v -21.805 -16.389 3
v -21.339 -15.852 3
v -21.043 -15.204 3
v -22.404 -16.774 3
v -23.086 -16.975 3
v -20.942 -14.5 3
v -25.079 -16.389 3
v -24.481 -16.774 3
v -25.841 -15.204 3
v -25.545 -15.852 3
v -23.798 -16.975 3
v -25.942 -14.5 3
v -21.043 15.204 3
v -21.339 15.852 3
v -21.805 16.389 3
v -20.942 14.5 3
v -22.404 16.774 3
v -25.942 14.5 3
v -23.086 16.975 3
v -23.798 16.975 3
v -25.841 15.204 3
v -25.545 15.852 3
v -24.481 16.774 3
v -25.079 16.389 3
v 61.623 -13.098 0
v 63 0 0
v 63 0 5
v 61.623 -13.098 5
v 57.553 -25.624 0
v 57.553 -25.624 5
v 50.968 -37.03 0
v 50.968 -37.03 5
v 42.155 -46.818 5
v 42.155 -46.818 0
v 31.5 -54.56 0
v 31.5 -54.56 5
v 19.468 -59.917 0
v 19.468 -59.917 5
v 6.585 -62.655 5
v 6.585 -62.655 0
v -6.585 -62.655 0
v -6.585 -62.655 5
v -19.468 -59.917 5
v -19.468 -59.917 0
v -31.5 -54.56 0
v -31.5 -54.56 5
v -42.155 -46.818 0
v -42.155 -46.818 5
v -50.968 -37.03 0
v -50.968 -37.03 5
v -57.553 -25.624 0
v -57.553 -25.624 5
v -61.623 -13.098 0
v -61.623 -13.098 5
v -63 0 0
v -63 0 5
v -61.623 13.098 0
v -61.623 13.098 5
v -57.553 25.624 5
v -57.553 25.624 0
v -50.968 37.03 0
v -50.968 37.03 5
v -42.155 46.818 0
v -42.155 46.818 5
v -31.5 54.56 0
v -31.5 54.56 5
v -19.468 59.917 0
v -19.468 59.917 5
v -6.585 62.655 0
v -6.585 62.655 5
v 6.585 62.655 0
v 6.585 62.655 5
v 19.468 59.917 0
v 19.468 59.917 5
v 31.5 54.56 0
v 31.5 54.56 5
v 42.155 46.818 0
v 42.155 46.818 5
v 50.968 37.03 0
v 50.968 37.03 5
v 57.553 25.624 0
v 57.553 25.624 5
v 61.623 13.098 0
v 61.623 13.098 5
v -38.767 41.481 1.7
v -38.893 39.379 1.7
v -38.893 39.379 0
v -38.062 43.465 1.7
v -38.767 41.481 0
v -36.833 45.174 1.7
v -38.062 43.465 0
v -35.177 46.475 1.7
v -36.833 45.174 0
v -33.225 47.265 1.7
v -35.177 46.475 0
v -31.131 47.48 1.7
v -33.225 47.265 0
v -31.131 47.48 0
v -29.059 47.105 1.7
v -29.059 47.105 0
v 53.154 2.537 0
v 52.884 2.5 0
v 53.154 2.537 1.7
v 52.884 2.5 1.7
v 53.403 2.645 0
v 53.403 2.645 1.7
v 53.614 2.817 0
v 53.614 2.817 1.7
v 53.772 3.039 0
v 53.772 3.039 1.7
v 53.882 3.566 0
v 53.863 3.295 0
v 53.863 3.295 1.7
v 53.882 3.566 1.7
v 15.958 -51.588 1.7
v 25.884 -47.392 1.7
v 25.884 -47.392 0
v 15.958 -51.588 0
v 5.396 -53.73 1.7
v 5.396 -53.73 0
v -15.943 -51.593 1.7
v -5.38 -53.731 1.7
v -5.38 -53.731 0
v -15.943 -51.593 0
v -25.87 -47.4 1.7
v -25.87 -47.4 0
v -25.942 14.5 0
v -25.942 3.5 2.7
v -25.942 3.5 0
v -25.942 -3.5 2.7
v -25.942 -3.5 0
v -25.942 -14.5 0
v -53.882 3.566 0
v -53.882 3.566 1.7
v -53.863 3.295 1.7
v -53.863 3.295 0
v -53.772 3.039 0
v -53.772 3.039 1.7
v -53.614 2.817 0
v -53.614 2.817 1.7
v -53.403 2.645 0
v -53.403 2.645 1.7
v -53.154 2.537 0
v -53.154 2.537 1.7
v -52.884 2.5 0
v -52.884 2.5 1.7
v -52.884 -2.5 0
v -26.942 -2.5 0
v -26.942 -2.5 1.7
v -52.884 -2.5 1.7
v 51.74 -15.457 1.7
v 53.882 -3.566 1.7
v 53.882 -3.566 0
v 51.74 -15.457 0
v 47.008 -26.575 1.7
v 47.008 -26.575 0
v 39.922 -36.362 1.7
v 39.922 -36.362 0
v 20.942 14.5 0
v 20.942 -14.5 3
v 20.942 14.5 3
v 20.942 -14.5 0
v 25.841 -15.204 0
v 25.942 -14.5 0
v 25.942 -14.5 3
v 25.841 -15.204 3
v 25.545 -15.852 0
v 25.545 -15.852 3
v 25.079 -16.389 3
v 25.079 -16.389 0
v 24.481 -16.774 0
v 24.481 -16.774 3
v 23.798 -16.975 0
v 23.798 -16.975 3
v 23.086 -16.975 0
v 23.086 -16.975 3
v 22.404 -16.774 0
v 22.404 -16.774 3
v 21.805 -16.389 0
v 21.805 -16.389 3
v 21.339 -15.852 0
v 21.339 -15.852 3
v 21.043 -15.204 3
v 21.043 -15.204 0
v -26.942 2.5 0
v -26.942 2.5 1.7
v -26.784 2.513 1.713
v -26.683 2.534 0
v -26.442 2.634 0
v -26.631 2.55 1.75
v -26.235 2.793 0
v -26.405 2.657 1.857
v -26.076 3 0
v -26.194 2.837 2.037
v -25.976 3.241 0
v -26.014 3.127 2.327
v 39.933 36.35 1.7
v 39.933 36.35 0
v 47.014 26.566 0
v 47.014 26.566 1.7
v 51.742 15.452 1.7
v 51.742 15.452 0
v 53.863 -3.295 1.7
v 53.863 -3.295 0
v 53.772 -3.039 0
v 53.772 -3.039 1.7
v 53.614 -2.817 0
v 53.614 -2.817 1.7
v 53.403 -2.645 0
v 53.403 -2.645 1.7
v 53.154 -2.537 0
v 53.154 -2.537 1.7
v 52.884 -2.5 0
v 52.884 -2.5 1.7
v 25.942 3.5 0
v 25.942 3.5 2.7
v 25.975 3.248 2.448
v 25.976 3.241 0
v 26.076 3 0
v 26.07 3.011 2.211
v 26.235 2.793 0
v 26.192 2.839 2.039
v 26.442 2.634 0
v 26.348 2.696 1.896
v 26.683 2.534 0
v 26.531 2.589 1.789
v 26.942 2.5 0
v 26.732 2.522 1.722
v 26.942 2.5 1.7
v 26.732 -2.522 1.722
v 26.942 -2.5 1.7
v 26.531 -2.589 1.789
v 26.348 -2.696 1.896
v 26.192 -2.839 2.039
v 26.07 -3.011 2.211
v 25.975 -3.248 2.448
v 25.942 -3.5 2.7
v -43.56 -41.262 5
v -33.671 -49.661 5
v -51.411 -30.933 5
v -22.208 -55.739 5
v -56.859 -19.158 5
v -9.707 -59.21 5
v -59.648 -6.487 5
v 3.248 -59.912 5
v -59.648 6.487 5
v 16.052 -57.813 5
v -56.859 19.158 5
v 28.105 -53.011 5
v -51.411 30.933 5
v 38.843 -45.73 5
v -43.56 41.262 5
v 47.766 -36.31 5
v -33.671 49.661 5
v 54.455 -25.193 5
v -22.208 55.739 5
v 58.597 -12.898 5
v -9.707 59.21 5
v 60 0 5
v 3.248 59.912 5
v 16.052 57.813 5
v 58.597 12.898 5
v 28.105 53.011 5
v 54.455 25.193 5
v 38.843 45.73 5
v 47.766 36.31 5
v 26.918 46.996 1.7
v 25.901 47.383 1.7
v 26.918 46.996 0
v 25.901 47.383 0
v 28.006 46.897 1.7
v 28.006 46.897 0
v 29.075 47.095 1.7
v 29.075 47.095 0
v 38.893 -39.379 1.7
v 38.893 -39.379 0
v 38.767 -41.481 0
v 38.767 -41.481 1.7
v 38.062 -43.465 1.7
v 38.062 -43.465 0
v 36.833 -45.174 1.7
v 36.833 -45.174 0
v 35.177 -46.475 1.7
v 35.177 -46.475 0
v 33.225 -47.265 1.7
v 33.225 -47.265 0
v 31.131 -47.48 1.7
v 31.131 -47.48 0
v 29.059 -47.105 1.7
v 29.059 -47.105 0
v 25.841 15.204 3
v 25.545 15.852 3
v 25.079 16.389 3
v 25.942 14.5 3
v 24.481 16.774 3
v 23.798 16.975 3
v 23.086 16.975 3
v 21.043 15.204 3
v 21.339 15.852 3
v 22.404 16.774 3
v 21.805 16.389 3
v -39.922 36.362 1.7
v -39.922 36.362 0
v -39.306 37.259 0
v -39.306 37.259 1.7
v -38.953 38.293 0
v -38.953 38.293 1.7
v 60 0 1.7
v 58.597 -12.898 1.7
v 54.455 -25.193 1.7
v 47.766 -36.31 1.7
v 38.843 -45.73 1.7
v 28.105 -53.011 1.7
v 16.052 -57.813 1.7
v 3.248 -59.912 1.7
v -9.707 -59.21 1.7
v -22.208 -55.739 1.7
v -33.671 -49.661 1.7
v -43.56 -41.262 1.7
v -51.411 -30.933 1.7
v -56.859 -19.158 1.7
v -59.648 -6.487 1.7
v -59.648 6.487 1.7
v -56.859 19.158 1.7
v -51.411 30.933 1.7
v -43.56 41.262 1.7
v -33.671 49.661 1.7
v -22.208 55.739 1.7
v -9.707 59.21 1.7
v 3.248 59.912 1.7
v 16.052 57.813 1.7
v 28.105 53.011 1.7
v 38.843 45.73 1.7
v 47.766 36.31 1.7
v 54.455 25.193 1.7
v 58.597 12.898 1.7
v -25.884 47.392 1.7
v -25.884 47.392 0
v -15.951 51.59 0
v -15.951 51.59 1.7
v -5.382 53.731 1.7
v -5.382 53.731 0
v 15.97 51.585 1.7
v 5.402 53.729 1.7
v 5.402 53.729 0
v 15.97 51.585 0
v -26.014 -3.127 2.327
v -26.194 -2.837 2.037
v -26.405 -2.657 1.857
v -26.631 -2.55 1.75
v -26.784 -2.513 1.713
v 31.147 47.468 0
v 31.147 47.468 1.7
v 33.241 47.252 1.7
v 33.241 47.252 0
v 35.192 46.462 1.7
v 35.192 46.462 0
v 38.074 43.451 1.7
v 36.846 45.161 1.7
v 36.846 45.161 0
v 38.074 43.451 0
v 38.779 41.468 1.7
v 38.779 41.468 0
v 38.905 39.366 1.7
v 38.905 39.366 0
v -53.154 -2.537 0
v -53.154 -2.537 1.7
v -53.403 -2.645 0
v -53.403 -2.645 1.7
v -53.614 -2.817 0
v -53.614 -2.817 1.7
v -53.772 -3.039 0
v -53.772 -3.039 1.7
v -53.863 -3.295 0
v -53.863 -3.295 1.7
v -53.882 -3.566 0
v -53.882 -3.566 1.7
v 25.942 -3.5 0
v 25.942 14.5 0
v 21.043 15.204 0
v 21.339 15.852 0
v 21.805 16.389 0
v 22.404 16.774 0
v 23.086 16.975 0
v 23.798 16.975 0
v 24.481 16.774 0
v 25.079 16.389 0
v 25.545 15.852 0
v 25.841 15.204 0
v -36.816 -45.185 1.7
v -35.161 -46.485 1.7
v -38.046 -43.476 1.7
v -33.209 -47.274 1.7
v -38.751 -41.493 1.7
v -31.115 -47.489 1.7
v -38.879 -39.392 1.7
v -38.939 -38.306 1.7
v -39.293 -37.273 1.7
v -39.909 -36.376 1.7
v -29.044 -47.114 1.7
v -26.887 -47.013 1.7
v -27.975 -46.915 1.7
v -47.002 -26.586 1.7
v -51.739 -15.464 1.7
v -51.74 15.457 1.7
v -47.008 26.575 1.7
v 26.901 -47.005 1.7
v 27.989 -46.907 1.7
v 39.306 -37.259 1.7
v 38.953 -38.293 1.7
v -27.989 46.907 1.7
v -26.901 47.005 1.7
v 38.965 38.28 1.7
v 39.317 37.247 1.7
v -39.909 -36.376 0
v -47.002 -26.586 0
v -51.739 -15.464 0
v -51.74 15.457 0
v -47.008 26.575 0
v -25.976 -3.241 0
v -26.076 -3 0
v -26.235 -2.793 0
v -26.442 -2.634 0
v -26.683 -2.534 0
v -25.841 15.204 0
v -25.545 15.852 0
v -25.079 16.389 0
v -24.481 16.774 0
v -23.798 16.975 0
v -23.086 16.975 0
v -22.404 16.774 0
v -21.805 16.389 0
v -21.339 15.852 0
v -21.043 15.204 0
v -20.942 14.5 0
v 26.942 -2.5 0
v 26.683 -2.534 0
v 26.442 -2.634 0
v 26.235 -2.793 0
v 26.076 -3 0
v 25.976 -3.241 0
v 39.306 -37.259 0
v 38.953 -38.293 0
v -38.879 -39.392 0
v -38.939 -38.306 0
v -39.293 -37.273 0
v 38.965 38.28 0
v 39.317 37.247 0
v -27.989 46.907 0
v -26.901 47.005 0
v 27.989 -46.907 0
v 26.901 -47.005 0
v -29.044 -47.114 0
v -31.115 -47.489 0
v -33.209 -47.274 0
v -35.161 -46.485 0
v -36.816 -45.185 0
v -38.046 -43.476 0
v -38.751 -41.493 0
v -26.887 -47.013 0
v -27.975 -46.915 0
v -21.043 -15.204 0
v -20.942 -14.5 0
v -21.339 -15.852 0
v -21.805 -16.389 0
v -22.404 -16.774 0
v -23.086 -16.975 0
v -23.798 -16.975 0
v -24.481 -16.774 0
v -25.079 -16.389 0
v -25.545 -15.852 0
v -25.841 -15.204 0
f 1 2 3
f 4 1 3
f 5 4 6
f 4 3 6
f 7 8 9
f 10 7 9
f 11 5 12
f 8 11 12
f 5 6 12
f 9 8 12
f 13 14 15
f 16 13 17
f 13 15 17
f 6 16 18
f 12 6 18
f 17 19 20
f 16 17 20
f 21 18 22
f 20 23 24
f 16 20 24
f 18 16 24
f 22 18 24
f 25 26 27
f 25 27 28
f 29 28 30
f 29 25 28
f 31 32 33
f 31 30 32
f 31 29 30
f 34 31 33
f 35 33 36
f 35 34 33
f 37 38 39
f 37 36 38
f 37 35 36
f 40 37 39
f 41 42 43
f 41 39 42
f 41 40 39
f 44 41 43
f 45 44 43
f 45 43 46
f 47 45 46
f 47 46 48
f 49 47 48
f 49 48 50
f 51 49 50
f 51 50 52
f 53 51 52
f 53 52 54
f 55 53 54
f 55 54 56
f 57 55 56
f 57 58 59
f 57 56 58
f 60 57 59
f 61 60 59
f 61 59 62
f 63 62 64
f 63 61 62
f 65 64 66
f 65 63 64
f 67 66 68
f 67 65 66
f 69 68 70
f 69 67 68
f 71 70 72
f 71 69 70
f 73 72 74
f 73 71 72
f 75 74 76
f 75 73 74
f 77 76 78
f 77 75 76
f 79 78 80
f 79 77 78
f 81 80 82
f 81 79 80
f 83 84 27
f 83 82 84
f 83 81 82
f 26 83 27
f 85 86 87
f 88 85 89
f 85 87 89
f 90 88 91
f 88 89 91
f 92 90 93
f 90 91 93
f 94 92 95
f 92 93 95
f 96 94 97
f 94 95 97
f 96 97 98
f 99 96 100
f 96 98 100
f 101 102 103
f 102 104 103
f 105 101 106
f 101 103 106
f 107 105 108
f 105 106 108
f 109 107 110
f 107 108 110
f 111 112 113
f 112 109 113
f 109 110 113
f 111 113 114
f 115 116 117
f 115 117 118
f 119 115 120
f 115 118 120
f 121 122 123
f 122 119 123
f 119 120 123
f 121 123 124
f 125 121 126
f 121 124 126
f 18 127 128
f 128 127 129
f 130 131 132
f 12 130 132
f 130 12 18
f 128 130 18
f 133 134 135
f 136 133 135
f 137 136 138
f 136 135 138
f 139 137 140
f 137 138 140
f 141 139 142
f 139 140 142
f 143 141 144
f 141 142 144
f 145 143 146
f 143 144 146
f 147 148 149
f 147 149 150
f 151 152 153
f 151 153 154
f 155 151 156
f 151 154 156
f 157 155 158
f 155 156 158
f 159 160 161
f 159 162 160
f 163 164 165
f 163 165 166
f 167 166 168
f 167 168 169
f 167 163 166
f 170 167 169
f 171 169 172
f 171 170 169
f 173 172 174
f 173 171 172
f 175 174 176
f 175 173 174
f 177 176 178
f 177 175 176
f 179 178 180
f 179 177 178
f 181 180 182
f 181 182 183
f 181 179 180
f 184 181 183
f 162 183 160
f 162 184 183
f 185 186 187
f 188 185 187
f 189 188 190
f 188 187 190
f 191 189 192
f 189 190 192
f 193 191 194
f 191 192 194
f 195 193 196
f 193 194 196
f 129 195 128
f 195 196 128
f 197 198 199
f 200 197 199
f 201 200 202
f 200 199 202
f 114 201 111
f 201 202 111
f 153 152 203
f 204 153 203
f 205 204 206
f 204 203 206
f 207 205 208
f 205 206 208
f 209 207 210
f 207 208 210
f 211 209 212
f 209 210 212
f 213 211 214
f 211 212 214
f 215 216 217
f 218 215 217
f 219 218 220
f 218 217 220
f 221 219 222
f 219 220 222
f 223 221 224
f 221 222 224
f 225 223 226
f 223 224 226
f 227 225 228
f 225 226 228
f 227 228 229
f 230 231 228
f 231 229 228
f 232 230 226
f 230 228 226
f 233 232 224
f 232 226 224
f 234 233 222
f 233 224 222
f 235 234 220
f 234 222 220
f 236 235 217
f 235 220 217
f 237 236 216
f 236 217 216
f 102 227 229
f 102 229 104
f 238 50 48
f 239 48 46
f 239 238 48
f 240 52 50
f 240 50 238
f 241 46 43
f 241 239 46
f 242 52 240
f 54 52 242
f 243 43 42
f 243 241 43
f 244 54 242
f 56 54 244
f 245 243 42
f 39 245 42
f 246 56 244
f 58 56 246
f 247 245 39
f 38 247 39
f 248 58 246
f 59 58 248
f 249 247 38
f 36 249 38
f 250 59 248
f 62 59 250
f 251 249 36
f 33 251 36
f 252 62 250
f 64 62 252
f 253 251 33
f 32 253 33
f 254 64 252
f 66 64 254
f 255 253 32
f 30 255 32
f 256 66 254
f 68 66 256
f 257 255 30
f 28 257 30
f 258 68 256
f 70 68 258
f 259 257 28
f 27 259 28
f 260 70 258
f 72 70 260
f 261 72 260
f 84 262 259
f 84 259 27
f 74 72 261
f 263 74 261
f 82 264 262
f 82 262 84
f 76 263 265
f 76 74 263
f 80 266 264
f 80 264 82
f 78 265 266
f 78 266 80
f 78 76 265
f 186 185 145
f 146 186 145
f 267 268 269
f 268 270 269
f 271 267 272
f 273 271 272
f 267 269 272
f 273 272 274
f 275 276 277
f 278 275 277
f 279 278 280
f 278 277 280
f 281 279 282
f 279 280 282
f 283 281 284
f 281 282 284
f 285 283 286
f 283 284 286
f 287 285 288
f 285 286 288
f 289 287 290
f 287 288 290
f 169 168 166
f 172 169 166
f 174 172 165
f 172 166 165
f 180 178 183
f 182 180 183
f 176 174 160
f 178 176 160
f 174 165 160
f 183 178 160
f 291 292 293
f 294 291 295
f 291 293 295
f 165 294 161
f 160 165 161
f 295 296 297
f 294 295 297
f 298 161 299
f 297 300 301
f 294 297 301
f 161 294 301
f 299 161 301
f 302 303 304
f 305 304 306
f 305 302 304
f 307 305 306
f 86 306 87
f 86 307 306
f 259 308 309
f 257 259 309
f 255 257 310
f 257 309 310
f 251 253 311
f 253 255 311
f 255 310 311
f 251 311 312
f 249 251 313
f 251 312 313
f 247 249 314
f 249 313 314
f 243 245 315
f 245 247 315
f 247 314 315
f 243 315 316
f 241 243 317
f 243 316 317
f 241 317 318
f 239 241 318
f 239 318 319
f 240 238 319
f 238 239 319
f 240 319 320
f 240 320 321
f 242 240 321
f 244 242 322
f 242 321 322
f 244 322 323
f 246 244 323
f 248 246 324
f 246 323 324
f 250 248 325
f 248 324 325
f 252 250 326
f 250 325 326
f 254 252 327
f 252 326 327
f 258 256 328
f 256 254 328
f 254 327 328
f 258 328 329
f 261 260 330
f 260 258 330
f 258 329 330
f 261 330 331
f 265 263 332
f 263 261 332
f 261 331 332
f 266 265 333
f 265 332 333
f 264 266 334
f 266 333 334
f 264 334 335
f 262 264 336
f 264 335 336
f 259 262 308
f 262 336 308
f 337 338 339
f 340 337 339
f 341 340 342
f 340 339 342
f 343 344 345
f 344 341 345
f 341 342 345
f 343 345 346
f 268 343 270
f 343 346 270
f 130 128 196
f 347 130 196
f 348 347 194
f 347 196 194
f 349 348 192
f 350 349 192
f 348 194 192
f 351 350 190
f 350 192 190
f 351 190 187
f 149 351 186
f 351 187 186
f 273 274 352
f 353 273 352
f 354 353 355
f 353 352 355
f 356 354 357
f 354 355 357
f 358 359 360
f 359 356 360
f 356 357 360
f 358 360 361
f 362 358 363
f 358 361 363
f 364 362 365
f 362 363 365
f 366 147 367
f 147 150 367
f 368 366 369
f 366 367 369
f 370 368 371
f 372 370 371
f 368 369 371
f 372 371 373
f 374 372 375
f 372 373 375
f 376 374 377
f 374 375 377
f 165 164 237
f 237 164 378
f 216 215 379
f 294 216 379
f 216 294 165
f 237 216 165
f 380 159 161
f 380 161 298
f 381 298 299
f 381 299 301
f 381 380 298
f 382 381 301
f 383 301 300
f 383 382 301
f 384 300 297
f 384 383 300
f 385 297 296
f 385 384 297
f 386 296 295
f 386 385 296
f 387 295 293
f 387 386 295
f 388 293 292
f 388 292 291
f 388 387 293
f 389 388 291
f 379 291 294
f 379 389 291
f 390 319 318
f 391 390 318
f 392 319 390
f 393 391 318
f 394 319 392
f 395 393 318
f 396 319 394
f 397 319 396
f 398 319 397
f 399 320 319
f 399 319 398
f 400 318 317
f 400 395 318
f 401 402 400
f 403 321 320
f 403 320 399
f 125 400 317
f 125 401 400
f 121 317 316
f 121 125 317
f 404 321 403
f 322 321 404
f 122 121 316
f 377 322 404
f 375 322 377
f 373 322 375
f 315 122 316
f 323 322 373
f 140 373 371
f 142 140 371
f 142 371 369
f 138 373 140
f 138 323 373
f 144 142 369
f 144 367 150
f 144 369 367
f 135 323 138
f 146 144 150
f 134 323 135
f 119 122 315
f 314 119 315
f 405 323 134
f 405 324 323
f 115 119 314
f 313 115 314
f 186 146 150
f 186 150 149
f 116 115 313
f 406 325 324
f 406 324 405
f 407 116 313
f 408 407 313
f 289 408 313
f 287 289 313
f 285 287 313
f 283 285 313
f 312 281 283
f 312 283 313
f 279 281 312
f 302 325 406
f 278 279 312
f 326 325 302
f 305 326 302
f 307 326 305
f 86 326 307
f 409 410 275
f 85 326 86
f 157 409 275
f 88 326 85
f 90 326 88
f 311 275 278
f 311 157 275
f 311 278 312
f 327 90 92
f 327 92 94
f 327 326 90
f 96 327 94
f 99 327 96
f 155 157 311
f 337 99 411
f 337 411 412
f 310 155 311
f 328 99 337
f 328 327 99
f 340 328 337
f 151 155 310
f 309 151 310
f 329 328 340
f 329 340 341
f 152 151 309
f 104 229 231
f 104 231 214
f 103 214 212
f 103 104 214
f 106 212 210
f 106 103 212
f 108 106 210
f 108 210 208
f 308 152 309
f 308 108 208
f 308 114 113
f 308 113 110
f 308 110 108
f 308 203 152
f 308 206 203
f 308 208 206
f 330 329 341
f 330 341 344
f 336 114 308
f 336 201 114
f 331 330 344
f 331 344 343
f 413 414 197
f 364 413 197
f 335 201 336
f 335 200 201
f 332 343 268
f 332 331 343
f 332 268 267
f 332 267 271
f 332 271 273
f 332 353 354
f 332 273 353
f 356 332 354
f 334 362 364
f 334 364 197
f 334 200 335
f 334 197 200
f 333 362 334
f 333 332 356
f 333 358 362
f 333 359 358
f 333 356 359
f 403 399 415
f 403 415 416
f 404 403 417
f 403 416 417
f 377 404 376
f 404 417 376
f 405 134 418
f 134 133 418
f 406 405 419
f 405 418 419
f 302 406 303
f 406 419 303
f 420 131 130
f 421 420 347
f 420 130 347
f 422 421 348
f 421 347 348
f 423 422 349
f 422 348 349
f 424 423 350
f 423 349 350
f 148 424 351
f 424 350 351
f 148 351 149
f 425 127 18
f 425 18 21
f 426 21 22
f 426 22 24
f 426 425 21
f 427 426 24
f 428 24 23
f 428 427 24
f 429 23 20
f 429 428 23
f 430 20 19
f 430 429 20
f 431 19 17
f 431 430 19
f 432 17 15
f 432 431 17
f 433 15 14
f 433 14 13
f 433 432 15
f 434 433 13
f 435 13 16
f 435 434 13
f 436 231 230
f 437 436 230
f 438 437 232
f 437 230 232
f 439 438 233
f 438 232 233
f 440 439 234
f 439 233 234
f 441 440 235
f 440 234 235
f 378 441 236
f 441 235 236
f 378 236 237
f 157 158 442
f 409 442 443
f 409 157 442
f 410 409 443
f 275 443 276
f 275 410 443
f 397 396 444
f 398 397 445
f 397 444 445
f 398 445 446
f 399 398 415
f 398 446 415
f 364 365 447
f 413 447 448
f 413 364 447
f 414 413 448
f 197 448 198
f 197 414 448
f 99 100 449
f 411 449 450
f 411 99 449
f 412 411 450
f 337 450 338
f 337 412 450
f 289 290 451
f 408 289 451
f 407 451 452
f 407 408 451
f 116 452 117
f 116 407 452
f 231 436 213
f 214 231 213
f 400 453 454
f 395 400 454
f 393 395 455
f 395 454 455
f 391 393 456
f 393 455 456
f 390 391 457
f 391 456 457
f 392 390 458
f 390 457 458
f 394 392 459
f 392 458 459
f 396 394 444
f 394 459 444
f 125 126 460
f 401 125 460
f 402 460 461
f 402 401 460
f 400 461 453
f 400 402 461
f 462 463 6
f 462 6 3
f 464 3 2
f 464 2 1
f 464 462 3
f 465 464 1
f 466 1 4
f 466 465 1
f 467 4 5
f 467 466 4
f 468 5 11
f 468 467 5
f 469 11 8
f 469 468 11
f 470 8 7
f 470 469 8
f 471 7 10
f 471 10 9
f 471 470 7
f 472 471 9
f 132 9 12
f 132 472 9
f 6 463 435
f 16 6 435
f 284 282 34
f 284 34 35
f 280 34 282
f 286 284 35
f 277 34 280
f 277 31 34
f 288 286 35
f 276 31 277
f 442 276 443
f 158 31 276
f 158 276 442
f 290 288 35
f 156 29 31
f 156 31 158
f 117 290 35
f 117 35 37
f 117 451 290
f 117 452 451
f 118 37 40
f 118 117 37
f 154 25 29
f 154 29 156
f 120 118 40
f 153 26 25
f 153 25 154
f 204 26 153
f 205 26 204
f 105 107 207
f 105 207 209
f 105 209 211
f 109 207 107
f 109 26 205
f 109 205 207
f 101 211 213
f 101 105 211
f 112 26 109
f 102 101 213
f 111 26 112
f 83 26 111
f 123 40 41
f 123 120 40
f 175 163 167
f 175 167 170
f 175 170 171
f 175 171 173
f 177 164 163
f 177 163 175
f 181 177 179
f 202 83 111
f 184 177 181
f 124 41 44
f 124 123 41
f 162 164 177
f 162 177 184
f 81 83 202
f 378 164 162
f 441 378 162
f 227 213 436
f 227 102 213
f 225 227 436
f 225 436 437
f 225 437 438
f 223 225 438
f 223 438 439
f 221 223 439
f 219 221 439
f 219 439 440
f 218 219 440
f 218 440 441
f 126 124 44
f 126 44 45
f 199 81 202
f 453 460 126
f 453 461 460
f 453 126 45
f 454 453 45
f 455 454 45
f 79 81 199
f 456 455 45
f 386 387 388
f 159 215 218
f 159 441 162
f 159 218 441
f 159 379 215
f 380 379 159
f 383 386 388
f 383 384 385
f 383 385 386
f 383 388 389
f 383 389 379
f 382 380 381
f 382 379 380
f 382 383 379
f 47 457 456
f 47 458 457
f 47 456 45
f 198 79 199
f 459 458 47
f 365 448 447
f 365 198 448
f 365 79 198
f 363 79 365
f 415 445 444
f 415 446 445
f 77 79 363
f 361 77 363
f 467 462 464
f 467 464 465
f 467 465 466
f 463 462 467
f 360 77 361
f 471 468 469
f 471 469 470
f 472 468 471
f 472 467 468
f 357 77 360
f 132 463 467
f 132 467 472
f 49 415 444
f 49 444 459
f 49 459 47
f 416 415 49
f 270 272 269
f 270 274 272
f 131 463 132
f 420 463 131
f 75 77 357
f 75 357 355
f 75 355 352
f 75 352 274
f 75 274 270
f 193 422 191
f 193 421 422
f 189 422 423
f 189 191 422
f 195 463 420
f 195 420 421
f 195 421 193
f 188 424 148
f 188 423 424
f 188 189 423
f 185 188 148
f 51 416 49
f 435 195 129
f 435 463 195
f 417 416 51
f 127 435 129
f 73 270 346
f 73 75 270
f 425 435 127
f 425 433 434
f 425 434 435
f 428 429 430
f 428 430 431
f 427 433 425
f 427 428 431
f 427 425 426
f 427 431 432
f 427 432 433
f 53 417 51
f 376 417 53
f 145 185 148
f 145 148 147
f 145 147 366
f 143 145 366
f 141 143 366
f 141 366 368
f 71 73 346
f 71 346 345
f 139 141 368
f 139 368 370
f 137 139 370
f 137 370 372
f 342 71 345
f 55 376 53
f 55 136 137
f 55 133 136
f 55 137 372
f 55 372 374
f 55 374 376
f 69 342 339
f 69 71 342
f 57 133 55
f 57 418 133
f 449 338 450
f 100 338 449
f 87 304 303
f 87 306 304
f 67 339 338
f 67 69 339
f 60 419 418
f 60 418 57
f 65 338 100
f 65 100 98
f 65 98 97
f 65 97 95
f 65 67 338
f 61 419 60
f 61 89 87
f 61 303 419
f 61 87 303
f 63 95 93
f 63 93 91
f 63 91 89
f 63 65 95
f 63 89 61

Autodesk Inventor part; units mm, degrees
ref_plane "YZ Plane" through (0, 0, 0) normal (1, 0, 0) x (0, 1, 0)
ref_plane "XZ Plane" through (0, 0, 0) normal (0, 1, 0) x (-1, 0, 0)
ref_plane "XY Plane" through (0, 0, 0) normal (0, 0, 1) x (1, 0, 0)
sketch "Esquisse1" plane through (0, 0, 0) normal (0, 0, 1) x (1, 0, 0)
  circle A0 centre (0, 0) radius 63
  circle A1 centre (0, 0) radius 60
  circle A2 centre (0, 0) radius 54
  line L0 (-25.9421, 2.5) -> (-53.9421, 2.5)
  line L1 (-25.9421, -2.5) -> (-53.9421, -2.5)
  line L2 (-20.9421, 0) -> (-20.9421, 14.5)
  line L3 (-25.9421, 14.5) -> (-25.9421, 2.5)
  line L4 (-20.9421, 0) -> (-20.9421, -14.5)
  line L5 (-25.9421, -14.5) -> (-25.9421, 2.5)
  arc A3 (-25.9421, -14.5) -> (-20.9421, -14.5) centre (-23.4421, -14.5) ccw
  arc A4 (-20.9421, 14.5) -> (-25.9421, 14.5) centre (-23.4421, 14.5) ccw
  line L6 (0, 0) -> (0, 11.8583)
  line L7 (25.9421, 2.5) -> (53.9421, 2.5)
  line L8 (25.9421, -2.5) -> (53.9421, -2.5)
  line L9 (20.9421, 0) -> (20.9421, 14.5)
  line L10 (25.9421, 14.5) -> (25.9421, 2.5)
  line L11 (20.9421, 0) -> (20.9421, -14.5)
  line L12 (25.9421, -14.5) -> (25.9421, 14.5)
  arc A5 (20.9421, -14.5) -> (25.9421, -14.5) centre (23.4421, -14.5) ccw
  arc A6 (25.9421, 14.5) -> (20.9421, 14.5) centre (23.4421, 14.5) ccw
  line L13 (25.9421, 2.5) -> (56.5559, 2.5)
  line L14 (56.5559, 2.5) -> (56.5559, -2.5)
  line L15 (56.5559, -2.5) -> (25.9421, -2.5)
  line L16 (25.9421, -2.5) -> (25.9421, 2.5)
  dimension "d0" = 126
  dimension "d1" = 120
  dimension "d2" = 108
  dimension "d3" = 28
  dimension "d6" = 14.5
  dimension "d8" = 5
extrude "Extrusion1" add sketch "Esquisse1" along normal blind 5 contours A0
extrude "Extrusion2" add sketch "Esquisse1" along normal blind 1.7 contours A1 | A2 L8 L12 L7 | A2 L13 L14 L15 | L0 L5 L1 A2
sketch "Esquisse3" plane through (0, 0, 0) normal (0, 0, -1) x (-1, 0, 0)
  line L0 (20.9421, 0) -> (20.9421, 14.5) projected
  line L1 (20.9421, 0) -> (20.9421, -14.5) projected
  arc A0 (20.9421, -14.5) -> (25.9421, -14.5) centre (23.4421, -14.5) ccw projected
  line L2 (25.9421, -14.5) -> (25.9421, 2.5) projected
  line L3 (25.9421, 14.5) -> (25.9421, 2.5) projected
  arc A1 (25.9421, 14.5) -> (20.9421, 14.5) centre (23.4421, 14.5) ccw projected
  arc A2 (-20.9421, 14.5) -> (-25.9421, 14.5) centre (-23.4421, 14.5) ccw projected
  line L4 (-25.9421, 14.5) -> (-25.9421, 2.5) projected
  line L5 (-25.9421, -14.5) -> (-25.9421, 14.5) projected
  arc A3 (-25.9421, -14.5) -> (-20.9421, -14.5) centre (-23.4421, -14.5) ccw projected
  line L6 (-20.9421, 0) -> (-20.9421, -14.5) projected
  line L7 (-20.9421, 0) -> (-20.9421, 14.5) projected
  point P0 (0, 0)
extrude "Extrusion3" add sketch "Esquisse3" against normal blind 3
fillet "Congé1" radius 1 3 edges at (25.9421, 0, 1.7) (25.9421, -2.5, 0.85) (25.9421, 2.5, 0.85)
fillet "Congé2" radius 1 3 edges at (-25.9421, 0, 1.7) (-25.9421, -2.5, 0.85) (-25.9421, 2.5, 0.85)
fillet "Congé3" radius 1 4 edges at (53.9421, 2.5, 0.85) (53.9421, -2.5, 0.85) (-53.9421, 2.5, 0.85) (-53.9421, -2.5, 0.85)
sketch "Esquisse4" plane through (0, 0, 0) normal (0, 0, -1) x (-1, 0, 0)
  arc A0 (53.8821, 3.566) -> (-53.8821, 3.566) centre (0, 0) ccw projected
  arc A1 (-53.8821, -3.566) -> (53.8821, -3.566) centre (0, 0) ccw projected
  arc A2 (53.8821, 3.566) -> (-53.8821, 3.566) centre (0, 0) ccw projected
  arc A3 (52.8843, 2.5) -> (53.8821, 3.566) centre (52.8843, 3.5) ccw projected
  line L0 (52.8843, 2.5) -> (26.9421, 2.5) projected
  arc A4 (25.9421, 3.5) -> (26.9421, 2.5) centre (26.9421, 3.5) ccw projected
  line L1 (25.9421, 3.5) -> (25.9421, 14.5) projected
  arc A5 (25.9421, 14.5) -> (20.9421, 14.5) centre (23.4421, 14.5) ccw projected
  line L2 (20.9421, 14.5) -> (20.9421, -14.5) projected
  arc A6 (20.9421, -14.5) -> (25.9421, -14.5) centre (23.4421, -14.5) ccw projected
  line L3 (25.9421, -14.5) -> (25.9421, -3.5) projected
  arc A7 (26.9421, -2.5) -> (25.9421, -3.5) centre (26.9421, -3.5) ccw projected
  line L4 (26.9421, -2.5) -> (52.8843, -2.5) projected
  arc A8 (53.8821, -3.566) -> (52.8843, -2.5) centre (52.8843, -3.5) ccw projected
  arc A9 (-53.8821, -3.566) -> (53.8821, -3.566) centre (0, 0) ccw projected
  arc A10 (-52.8843, -2.5) -> (-53.8821, -3.566) centre (-52.8843, -3.5) ccw projected
  line L5 (-26.9421, -2.5) -> (-52.8843, -2.5) projected
  arc A11 (-25.9421, -3.5) -> (-26.9421, -2.5) centre (-26.9421, -3.5) ccw projected
  line L6 (-25.9421, -3.5) -> (-25.9421, -14.5) projected
  arc A12 (-25.9421, -14.5) -> (-20.9421, -14.5) centre (-23.4421, -14.5) ccw projected
  line L7 (-20.9421, -14.5) -> (-20.9421, 14.5) projected
  arc A13 (-20.9421, 14.5) -> (-25.9421, 14.5) centre (-23.4421, 14.5) ccw projected
  line L8 (-25.9421, 14.5) -> (-25.9421, 3.5) projected
  arc A14 (-26.9421, 2.5) -> (-25.9421, 3.5) centre (-26.9421, 3.5) ccw projected
  line L9 (-52.8843, 2.5) -> (-26.9421, 2.5) projected
  arc A15 (-53.8821, 3.566) -> (-52.8843, 2.5) centre (-52.8843, 3.5) ccw projected
  circle A16 centre (0, 0) radius 63 projected
  line L10 (32.9786, 41.9728) -> (-33, 41.9728)
  line L11 (-33, 41.9728) -> (-33, -42)
  line L12 (-33, -42) -> (32.9786, -42)
  line L13 (32.9786, -42) -> (32.9786, 41.9728)
  line L14 (32.9786, 32.8) -> (-33, 32.8)
  line L15 (32.9786, -32.8) -> (-33, -32.8)
  line L16 (-33.3624, -42.4612) -> (38.9228, 49.5381)
  line L17 (33.3492, -42.4716) -> (-38.936, 49.5277)
  line L18 (-33.2831, 42.3332) -> (-36.4284, 39.8619)
  line L19 (-33.2831, 42.3332) -> (-30.1379, 44.8045)
  arc A17 (-30.1379, 44.8045) -> (-36.4284, 39.8619) centre (-32.5624, 41.4158) ccw
  line L20 (33.2707, 42.3445) -> (30.1254, 44.8158)
  line L21 (33.2707, 42.3445) -> (36.416, 39.8733)
  line L22 (33.2831, -42.3332) -> (36.4284, -39.8619)
  line L23 (33.2831, -42.3332) -> (30.1379, -44.8045)
  arc A18 (30.1379, -44.8045) -> (36.4284, -39.8619) centre (32.5624, -41.4158) ccw
  arc A19 (36.416, 39.8733) -> (30.1254, 44.8158) centre (32.5499, 41.4272) ccw
  line L24 (-33.2707, -42.3445) -> (-36.416, -39.8733)
  arc A20 (-36.416, -39.8733) -> (-30.1254, -44.8158) centre (-32.5499, -41.4272) ccw
  line L25 (-33.2707, -42.3445) -> (-30.1254, -44.8158)
  arc A21 (-53.8821, -3.566) -> (53.8821, -3.566) centre (0, 0) ccw projected
  line L26 (-38.5851, -37.7782) -> (-27.5766, -46.4277)
  arc A22 (-38.5851, -37.7782) -> (-27.5766, -46.4277) centre (-31.4173, -39.9857) ccw
  line L27 (-38.5969, 37.7661) -> (-27.5885, 46.4156)
  arc A23 (-27.5885, 46.4156) -> (-38.5969, 37.7661) centre (-31.4292, 39.9736) ccw
  line L28 (27.5621, -46.4363) -> (38.5705, -37.7868)
  arc A24 (27.5621, -46.4363) -> (38.5705, -37.7868) centre (31.4028, -39.9943) ccw
  line L29 (27.5766, 46.4277) -> (38.5851, 37.7782)
  arc A25 (38.5851, 37.7782) -> (27.5766, 46.4277) centre (31.4173, 39.9857) ccw
  point P0 (-35.1366, 44.6921)
  point P1 (35.1242, 44.7035)
  point P2 (33, -41.9728)
  point P3 (35.1366, -44.6921)
  point P4 (-32.9786, -41.9728)
  point P5 (-35.1242, -44.7035)
  point P6 (-38.9228, -49.5381)
  dimension "d42" = 33
  dimension "d43" = 42
  dimension "d44" = 4
  dimension "d45" = 4
  dimension "d46" = 3
  dimension "d47" = 65.9786
  dimension "d48" = 83.9728
  dimension "d53" = 4
  dimension "d54" = 4
  dimension "d55" = 3
  dimension "d58" = 360
  dimension "d62" = 360
  dimension "d80" = 7
  dimension "d81" = 14
  dimension "d82" = 7.5
  dimension "d83" = 14
  dimension "d84" = 7
  dimension "d85" = 7.5
  dimension "d86" = 14
  dimension "d87" = 7
  dimension "d88" = 7.5
  dimension "d89" = 14
  dimension "d90" = 7
  dimension "d91" = 7.5
extrude "Extrusion4" cut sketch "Esquisse4" against normal blind 10 contours L25 A1 L16 | L16 A1 L24 | A20 A1
extrude "Extrusion5" cut sketch "Esquisse4" against normal blind 10 contours L18 A0 L17 | A0 A17 L17 picked at (-34.5217, 42.711)
extrude "Extrusion6" cut sketch "Esquisse4" against normal blind 10 contours L19 L17 A0 | A0 L17 A17 picked at (-33.3576, 43.626)
extrude "Extrusion7" cut sketch "Esquisse4" against normal blind 10 contours L21 L16 A0 | A0 L16 A19 picked at (34.5088, 42.7218)
extrude "Extrusion8" cut sketch "Esquisse4" against normal blind 10 contours A18 A1 | A1 L17 L23 L22 | L17 A1 L23
extrude "Extrusion9" cut sketch "Esquisse4" against normal blind 10 contours L16 L20 A0 | A0 A19 L16 picked at (33.3443, 43.6367)
fillet "Congé4" radius 4 6 edges at (36.416, -39.8733, 0.85) (30.1254, -44.8158, 0.85) (36.4284, 39.8619, 0.85) (-36.416, 39.8733, 0.85) (-30.14, -44.806, 0.85) (-36.4284, -39.8619, 0.85)
extrude "Extrusion10" cut sketch "Esquisse4" against normal blind 10 contours A24 A1 A18 | A1 L22 L23 L17 L28 A24 | L17 L23 A1 L28
extrude "Extrusion11" cut sketch "Esquisse4" against normal blind 10 contours L29 L16 L21 A0 | A0 A19 L16 A25 | L29 A0 L20 L16 | L16 A19 A0 A25
extrude "Extrusion12" cut sketch "Esquisse4" against normal blind 10 contours A23 L27 L17 L19 A0 | A0 A17 L17 A23 | L27 A0 L18 L17 | L17 A17 A0 A23
extrude "Extrusion13" cut sketch "Esquisse4" against normal blind 10 contours L26 A1 L25 L16 | L16 L24 A1 L26 | A22 A1 A20
fillet "Congé5" radius 4 8 edges at (38.5851, -37.7782, 0.85) (27.5766, -46.4277, 0.85) (-27.5621, -46.4363, 0.85) (-38.572, -37.7916, 0.85) (27.5927, 46.4181, 0.85) (38.5969, 37.7661, 0.85) (-38.5851, 37.7782, 0.85) (-27.5766, 46.4277, 0.85)
equation "\"d80\" = 0.5 * d81"
equation "\"d90\" = 0.5 * d89"
properties part number "bumper_modified2" material "Plastique ABS"
